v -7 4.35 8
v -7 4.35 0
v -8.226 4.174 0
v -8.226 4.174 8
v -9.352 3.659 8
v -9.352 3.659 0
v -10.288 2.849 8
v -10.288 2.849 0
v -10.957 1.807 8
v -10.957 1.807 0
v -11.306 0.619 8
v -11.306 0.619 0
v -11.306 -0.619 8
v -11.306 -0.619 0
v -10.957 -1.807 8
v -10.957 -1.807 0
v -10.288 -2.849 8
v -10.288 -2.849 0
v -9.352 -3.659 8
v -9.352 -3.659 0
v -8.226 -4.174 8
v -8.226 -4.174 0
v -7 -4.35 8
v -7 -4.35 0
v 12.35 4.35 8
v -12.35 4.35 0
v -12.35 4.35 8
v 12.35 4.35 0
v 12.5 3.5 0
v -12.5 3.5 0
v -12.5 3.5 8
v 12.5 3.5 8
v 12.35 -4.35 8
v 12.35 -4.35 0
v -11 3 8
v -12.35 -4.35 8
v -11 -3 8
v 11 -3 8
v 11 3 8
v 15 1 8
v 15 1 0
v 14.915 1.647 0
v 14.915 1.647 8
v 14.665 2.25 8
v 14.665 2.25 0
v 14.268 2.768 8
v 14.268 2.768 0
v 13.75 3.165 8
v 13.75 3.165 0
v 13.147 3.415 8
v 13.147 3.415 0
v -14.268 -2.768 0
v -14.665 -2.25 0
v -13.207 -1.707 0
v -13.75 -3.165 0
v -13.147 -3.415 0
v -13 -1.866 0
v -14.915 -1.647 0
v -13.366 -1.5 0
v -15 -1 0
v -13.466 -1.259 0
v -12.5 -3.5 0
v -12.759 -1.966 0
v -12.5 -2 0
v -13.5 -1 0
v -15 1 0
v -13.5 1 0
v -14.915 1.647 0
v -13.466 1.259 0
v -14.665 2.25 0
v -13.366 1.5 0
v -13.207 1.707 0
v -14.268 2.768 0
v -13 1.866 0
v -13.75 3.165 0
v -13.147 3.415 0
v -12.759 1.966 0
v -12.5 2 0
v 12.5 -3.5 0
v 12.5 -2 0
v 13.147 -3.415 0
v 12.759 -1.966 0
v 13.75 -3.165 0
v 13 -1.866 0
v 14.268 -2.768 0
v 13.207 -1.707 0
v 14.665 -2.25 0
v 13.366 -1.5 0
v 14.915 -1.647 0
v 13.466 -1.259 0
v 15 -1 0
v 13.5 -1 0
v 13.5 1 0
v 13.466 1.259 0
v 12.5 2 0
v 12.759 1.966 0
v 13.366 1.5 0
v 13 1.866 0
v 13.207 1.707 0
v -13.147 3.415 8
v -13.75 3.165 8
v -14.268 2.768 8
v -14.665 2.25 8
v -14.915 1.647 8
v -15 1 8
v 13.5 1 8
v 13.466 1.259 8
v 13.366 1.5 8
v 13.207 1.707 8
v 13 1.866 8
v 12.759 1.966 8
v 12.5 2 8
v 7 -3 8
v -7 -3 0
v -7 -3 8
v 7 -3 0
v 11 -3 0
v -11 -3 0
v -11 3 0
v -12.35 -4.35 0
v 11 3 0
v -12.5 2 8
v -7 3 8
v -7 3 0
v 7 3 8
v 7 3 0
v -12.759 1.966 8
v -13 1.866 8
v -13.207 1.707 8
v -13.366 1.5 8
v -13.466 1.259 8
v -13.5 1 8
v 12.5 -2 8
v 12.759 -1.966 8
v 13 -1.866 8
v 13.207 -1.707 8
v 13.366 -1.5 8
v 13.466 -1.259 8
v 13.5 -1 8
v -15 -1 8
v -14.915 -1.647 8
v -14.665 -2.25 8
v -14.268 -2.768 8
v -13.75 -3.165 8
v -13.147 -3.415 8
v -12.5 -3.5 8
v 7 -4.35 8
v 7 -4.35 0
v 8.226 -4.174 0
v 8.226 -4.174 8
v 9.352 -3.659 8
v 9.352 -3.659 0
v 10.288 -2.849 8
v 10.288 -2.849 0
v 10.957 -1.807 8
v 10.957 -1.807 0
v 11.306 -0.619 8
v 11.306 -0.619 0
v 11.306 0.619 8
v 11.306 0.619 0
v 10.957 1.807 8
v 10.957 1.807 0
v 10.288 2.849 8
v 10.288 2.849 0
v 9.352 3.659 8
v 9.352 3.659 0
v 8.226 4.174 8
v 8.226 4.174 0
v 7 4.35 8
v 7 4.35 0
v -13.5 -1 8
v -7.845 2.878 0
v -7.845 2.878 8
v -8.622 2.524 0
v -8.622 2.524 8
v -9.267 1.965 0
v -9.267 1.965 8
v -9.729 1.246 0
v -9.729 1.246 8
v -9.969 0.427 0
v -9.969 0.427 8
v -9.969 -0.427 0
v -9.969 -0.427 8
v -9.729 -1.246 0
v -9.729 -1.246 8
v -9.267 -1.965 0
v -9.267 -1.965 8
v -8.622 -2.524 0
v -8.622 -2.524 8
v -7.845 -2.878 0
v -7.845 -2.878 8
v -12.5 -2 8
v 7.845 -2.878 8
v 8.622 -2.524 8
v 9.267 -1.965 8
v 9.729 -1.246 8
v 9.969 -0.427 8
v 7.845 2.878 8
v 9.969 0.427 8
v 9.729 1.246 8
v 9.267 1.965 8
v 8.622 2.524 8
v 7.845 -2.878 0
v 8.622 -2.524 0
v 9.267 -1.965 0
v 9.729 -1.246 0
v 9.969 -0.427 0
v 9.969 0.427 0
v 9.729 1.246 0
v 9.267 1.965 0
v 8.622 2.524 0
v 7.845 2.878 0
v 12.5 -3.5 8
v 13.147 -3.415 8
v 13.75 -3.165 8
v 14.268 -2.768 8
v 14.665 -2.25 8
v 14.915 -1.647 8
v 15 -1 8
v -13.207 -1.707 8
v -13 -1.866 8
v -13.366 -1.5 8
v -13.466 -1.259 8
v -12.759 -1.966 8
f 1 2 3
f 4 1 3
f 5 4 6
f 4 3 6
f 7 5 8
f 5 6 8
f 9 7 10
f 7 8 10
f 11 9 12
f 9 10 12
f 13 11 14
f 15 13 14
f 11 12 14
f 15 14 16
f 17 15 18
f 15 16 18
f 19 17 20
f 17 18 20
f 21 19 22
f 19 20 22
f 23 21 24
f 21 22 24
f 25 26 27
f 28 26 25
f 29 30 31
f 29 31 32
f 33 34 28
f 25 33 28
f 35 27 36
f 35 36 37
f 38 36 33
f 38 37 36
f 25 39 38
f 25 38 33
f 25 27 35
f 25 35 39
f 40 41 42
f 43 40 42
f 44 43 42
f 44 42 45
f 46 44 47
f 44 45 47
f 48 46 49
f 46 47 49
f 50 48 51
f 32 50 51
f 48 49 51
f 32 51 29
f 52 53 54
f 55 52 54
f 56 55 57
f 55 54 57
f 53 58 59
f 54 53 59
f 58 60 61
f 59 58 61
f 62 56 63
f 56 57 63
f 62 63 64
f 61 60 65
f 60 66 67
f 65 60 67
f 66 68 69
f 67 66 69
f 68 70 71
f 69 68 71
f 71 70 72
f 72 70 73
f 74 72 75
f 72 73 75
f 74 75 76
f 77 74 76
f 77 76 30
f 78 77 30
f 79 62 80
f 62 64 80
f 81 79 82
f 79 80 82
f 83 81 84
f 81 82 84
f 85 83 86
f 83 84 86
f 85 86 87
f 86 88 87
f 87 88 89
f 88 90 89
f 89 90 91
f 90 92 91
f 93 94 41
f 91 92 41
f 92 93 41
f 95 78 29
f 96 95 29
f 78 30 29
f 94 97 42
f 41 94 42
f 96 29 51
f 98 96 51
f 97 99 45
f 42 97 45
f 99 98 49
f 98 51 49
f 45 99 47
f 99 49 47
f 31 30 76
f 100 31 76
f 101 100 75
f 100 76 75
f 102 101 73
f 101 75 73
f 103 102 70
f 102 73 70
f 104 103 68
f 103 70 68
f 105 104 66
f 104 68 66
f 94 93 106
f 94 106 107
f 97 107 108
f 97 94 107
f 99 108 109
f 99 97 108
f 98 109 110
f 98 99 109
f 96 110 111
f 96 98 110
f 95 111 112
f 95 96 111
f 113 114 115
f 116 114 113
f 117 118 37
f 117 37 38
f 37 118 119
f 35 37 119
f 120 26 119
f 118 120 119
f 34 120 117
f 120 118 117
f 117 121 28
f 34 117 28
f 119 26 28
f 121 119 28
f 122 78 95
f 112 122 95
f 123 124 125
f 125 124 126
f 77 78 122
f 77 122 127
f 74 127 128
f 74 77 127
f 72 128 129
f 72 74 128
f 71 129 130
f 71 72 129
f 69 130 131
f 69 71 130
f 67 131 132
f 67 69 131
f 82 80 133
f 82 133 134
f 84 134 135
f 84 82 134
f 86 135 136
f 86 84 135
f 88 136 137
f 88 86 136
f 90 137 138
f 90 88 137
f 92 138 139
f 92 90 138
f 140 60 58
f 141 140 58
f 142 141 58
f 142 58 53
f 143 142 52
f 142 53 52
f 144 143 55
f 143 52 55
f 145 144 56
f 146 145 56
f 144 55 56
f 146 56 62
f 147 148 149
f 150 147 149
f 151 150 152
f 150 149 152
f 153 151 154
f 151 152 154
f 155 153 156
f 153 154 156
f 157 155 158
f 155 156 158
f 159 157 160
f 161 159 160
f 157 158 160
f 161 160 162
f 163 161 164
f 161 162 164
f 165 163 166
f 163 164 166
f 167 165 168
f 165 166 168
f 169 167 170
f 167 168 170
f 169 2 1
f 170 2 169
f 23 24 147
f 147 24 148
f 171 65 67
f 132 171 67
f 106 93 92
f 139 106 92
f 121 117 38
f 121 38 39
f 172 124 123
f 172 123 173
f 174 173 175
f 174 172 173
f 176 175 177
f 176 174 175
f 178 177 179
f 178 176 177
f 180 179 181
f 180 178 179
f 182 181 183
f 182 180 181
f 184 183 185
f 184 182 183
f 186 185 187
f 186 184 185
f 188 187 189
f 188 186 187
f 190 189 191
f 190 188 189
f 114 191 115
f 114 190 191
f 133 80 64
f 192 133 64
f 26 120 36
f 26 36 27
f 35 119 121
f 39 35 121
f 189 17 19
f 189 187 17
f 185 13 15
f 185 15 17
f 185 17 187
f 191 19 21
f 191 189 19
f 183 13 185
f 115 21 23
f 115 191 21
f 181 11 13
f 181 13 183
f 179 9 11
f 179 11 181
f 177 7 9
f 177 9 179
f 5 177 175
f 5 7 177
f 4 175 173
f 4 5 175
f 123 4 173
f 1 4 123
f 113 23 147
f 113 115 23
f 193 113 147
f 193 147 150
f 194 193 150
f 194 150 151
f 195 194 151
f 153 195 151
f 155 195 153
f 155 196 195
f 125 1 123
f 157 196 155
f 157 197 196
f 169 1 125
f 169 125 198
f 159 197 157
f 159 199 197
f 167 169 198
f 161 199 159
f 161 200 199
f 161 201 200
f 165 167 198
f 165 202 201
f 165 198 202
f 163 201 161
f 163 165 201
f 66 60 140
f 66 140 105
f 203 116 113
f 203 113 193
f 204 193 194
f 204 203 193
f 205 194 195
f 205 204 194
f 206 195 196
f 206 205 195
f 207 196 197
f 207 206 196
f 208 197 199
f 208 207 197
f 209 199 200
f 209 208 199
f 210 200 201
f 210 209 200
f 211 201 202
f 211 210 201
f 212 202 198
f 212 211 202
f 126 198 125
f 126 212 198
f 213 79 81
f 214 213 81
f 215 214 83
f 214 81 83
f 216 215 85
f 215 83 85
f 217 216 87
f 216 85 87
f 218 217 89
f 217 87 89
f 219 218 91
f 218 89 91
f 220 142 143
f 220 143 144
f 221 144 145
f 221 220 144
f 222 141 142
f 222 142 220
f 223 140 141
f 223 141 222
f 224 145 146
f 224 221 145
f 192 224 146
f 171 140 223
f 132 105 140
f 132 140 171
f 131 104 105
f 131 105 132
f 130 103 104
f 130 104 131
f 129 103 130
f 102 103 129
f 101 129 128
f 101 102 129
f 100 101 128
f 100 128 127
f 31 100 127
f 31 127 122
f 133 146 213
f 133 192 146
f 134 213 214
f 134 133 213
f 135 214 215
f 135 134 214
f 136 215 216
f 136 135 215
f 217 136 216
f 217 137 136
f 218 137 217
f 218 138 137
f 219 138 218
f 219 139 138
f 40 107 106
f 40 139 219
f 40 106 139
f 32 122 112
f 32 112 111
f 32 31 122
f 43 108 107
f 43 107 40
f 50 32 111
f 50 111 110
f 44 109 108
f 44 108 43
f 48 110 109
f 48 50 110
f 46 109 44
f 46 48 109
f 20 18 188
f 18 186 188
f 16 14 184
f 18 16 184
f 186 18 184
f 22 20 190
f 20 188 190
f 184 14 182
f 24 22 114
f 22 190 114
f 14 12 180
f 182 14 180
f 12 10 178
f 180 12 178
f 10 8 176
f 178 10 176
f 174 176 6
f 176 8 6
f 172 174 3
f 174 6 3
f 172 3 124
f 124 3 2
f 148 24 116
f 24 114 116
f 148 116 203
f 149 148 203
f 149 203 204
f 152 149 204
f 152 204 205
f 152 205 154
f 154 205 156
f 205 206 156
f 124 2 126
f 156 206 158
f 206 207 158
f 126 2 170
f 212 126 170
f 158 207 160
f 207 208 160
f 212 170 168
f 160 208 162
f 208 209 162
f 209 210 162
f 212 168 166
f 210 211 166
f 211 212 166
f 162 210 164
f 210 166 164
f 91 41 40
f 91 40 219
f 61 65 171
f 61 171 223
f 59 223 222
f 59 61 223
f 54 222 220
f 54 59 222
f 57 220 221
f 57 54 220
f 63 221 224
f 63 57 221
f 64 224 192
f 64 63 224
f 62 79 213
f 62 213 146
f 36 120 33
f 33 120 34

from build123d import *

# Parameters (mm, degrees)
SKETCH_W     = 24.7
SKETCH_H     = 8.7
SKETCH_W_2   = 22
SKETCH_H_2   = 6
PAD_DEPTH    = 8
PAD001_DEPTH = 8
PAD002_DEPTH = 8


with BuildPart() as body:
    # Sketch → Pad (new body)
    with BuildSketch(Plane.XY):
        Rectangle(SKETCH_W, SKETCH_H)
        Rectangle(SKETCH_W_2, SKETCH_H_2, mode=Mode.SUBTRACT)
    extrude(amount=PAD_DEPTH)


with BuildPart() as body001:
    # Sketch001 → Pad001 (new body)
    with BuildSketch(Plane.XY):
        with BuildLine():
            ThreePointArc((-7, 4.35), (-11.35, 0), (-7, -4.35))
            Line((-7, -4.35), (7, -4.35))
            ThreePointArc((7, -4.35), (11.35, 0), (7, 4.35))
            Line((-7, 4.35), (7, 4.35))
        make_face()
        with BuildLine():
            ThreePointArc((-7, 3), (-10, 0), (-7, -3))
            Line((-7, -3), (7, -3))
            ThreePointArc((7, -3), (10, 0), (7, 3))
            Line((-7, 3), (7, 3))
        make_face(mode=Mode.SUBTRACT)
    extrude(amount=PAD001_DEPTH)


with BuildPart() as body002:
    # Sketch002 → Pad002 (new body)
    with BuildSketch(Plane.XY):
        with BuildLine():
            ThreePointArc((-12.5, 3.5), (-14.267767, 2.767767), (-15, 1))
            Line((-15, -1), (-15, 1))
            ThreePointArc((-15, -1), (-14.267767, -2.767767), (-12.5, -3.5))
            Line((12.5, -3.5), (-12.5, -3.5))
            ThreePointArc((12.5, -3.5), (14.267767, -2.767767), (15, -1))
            Line((15, 1), (15, -1))
            ThreePointArc((15, 1), (14.267767, 2.767767), (12.5, 3.5))
            Line((-12.5, 3.5), (12.5, 3.5))
        make_face()
        with BuildLine():
            ThreePointArc((-12.5, 2), (-13.207107, 1.707107), (-13.5, 1))
            Line((-13.5, -1), (-13.5, 1))
            ThreePointArc((-13.5, -1), (-13.207107, -1.707107), (-12.5, -2))
            Line((12.5, -2), (-12.5, -2))
            ThreePointArc((12.5, -2), (13.207107, -1.707107), (13.5, -1))
            Line((13.5, 1), (13.5, -1))
            ThreePointArc((13.5, 1), (13.207107, 1.707107), (12.5, 2))
            Line((-12.5, 2), (12.5, 2))
        make_face(mode=Mode.SUBTRACT)
    extrude(amount=PAD002_DEPTH)


solid = Compound([body.part, body001.part, body002.part])
